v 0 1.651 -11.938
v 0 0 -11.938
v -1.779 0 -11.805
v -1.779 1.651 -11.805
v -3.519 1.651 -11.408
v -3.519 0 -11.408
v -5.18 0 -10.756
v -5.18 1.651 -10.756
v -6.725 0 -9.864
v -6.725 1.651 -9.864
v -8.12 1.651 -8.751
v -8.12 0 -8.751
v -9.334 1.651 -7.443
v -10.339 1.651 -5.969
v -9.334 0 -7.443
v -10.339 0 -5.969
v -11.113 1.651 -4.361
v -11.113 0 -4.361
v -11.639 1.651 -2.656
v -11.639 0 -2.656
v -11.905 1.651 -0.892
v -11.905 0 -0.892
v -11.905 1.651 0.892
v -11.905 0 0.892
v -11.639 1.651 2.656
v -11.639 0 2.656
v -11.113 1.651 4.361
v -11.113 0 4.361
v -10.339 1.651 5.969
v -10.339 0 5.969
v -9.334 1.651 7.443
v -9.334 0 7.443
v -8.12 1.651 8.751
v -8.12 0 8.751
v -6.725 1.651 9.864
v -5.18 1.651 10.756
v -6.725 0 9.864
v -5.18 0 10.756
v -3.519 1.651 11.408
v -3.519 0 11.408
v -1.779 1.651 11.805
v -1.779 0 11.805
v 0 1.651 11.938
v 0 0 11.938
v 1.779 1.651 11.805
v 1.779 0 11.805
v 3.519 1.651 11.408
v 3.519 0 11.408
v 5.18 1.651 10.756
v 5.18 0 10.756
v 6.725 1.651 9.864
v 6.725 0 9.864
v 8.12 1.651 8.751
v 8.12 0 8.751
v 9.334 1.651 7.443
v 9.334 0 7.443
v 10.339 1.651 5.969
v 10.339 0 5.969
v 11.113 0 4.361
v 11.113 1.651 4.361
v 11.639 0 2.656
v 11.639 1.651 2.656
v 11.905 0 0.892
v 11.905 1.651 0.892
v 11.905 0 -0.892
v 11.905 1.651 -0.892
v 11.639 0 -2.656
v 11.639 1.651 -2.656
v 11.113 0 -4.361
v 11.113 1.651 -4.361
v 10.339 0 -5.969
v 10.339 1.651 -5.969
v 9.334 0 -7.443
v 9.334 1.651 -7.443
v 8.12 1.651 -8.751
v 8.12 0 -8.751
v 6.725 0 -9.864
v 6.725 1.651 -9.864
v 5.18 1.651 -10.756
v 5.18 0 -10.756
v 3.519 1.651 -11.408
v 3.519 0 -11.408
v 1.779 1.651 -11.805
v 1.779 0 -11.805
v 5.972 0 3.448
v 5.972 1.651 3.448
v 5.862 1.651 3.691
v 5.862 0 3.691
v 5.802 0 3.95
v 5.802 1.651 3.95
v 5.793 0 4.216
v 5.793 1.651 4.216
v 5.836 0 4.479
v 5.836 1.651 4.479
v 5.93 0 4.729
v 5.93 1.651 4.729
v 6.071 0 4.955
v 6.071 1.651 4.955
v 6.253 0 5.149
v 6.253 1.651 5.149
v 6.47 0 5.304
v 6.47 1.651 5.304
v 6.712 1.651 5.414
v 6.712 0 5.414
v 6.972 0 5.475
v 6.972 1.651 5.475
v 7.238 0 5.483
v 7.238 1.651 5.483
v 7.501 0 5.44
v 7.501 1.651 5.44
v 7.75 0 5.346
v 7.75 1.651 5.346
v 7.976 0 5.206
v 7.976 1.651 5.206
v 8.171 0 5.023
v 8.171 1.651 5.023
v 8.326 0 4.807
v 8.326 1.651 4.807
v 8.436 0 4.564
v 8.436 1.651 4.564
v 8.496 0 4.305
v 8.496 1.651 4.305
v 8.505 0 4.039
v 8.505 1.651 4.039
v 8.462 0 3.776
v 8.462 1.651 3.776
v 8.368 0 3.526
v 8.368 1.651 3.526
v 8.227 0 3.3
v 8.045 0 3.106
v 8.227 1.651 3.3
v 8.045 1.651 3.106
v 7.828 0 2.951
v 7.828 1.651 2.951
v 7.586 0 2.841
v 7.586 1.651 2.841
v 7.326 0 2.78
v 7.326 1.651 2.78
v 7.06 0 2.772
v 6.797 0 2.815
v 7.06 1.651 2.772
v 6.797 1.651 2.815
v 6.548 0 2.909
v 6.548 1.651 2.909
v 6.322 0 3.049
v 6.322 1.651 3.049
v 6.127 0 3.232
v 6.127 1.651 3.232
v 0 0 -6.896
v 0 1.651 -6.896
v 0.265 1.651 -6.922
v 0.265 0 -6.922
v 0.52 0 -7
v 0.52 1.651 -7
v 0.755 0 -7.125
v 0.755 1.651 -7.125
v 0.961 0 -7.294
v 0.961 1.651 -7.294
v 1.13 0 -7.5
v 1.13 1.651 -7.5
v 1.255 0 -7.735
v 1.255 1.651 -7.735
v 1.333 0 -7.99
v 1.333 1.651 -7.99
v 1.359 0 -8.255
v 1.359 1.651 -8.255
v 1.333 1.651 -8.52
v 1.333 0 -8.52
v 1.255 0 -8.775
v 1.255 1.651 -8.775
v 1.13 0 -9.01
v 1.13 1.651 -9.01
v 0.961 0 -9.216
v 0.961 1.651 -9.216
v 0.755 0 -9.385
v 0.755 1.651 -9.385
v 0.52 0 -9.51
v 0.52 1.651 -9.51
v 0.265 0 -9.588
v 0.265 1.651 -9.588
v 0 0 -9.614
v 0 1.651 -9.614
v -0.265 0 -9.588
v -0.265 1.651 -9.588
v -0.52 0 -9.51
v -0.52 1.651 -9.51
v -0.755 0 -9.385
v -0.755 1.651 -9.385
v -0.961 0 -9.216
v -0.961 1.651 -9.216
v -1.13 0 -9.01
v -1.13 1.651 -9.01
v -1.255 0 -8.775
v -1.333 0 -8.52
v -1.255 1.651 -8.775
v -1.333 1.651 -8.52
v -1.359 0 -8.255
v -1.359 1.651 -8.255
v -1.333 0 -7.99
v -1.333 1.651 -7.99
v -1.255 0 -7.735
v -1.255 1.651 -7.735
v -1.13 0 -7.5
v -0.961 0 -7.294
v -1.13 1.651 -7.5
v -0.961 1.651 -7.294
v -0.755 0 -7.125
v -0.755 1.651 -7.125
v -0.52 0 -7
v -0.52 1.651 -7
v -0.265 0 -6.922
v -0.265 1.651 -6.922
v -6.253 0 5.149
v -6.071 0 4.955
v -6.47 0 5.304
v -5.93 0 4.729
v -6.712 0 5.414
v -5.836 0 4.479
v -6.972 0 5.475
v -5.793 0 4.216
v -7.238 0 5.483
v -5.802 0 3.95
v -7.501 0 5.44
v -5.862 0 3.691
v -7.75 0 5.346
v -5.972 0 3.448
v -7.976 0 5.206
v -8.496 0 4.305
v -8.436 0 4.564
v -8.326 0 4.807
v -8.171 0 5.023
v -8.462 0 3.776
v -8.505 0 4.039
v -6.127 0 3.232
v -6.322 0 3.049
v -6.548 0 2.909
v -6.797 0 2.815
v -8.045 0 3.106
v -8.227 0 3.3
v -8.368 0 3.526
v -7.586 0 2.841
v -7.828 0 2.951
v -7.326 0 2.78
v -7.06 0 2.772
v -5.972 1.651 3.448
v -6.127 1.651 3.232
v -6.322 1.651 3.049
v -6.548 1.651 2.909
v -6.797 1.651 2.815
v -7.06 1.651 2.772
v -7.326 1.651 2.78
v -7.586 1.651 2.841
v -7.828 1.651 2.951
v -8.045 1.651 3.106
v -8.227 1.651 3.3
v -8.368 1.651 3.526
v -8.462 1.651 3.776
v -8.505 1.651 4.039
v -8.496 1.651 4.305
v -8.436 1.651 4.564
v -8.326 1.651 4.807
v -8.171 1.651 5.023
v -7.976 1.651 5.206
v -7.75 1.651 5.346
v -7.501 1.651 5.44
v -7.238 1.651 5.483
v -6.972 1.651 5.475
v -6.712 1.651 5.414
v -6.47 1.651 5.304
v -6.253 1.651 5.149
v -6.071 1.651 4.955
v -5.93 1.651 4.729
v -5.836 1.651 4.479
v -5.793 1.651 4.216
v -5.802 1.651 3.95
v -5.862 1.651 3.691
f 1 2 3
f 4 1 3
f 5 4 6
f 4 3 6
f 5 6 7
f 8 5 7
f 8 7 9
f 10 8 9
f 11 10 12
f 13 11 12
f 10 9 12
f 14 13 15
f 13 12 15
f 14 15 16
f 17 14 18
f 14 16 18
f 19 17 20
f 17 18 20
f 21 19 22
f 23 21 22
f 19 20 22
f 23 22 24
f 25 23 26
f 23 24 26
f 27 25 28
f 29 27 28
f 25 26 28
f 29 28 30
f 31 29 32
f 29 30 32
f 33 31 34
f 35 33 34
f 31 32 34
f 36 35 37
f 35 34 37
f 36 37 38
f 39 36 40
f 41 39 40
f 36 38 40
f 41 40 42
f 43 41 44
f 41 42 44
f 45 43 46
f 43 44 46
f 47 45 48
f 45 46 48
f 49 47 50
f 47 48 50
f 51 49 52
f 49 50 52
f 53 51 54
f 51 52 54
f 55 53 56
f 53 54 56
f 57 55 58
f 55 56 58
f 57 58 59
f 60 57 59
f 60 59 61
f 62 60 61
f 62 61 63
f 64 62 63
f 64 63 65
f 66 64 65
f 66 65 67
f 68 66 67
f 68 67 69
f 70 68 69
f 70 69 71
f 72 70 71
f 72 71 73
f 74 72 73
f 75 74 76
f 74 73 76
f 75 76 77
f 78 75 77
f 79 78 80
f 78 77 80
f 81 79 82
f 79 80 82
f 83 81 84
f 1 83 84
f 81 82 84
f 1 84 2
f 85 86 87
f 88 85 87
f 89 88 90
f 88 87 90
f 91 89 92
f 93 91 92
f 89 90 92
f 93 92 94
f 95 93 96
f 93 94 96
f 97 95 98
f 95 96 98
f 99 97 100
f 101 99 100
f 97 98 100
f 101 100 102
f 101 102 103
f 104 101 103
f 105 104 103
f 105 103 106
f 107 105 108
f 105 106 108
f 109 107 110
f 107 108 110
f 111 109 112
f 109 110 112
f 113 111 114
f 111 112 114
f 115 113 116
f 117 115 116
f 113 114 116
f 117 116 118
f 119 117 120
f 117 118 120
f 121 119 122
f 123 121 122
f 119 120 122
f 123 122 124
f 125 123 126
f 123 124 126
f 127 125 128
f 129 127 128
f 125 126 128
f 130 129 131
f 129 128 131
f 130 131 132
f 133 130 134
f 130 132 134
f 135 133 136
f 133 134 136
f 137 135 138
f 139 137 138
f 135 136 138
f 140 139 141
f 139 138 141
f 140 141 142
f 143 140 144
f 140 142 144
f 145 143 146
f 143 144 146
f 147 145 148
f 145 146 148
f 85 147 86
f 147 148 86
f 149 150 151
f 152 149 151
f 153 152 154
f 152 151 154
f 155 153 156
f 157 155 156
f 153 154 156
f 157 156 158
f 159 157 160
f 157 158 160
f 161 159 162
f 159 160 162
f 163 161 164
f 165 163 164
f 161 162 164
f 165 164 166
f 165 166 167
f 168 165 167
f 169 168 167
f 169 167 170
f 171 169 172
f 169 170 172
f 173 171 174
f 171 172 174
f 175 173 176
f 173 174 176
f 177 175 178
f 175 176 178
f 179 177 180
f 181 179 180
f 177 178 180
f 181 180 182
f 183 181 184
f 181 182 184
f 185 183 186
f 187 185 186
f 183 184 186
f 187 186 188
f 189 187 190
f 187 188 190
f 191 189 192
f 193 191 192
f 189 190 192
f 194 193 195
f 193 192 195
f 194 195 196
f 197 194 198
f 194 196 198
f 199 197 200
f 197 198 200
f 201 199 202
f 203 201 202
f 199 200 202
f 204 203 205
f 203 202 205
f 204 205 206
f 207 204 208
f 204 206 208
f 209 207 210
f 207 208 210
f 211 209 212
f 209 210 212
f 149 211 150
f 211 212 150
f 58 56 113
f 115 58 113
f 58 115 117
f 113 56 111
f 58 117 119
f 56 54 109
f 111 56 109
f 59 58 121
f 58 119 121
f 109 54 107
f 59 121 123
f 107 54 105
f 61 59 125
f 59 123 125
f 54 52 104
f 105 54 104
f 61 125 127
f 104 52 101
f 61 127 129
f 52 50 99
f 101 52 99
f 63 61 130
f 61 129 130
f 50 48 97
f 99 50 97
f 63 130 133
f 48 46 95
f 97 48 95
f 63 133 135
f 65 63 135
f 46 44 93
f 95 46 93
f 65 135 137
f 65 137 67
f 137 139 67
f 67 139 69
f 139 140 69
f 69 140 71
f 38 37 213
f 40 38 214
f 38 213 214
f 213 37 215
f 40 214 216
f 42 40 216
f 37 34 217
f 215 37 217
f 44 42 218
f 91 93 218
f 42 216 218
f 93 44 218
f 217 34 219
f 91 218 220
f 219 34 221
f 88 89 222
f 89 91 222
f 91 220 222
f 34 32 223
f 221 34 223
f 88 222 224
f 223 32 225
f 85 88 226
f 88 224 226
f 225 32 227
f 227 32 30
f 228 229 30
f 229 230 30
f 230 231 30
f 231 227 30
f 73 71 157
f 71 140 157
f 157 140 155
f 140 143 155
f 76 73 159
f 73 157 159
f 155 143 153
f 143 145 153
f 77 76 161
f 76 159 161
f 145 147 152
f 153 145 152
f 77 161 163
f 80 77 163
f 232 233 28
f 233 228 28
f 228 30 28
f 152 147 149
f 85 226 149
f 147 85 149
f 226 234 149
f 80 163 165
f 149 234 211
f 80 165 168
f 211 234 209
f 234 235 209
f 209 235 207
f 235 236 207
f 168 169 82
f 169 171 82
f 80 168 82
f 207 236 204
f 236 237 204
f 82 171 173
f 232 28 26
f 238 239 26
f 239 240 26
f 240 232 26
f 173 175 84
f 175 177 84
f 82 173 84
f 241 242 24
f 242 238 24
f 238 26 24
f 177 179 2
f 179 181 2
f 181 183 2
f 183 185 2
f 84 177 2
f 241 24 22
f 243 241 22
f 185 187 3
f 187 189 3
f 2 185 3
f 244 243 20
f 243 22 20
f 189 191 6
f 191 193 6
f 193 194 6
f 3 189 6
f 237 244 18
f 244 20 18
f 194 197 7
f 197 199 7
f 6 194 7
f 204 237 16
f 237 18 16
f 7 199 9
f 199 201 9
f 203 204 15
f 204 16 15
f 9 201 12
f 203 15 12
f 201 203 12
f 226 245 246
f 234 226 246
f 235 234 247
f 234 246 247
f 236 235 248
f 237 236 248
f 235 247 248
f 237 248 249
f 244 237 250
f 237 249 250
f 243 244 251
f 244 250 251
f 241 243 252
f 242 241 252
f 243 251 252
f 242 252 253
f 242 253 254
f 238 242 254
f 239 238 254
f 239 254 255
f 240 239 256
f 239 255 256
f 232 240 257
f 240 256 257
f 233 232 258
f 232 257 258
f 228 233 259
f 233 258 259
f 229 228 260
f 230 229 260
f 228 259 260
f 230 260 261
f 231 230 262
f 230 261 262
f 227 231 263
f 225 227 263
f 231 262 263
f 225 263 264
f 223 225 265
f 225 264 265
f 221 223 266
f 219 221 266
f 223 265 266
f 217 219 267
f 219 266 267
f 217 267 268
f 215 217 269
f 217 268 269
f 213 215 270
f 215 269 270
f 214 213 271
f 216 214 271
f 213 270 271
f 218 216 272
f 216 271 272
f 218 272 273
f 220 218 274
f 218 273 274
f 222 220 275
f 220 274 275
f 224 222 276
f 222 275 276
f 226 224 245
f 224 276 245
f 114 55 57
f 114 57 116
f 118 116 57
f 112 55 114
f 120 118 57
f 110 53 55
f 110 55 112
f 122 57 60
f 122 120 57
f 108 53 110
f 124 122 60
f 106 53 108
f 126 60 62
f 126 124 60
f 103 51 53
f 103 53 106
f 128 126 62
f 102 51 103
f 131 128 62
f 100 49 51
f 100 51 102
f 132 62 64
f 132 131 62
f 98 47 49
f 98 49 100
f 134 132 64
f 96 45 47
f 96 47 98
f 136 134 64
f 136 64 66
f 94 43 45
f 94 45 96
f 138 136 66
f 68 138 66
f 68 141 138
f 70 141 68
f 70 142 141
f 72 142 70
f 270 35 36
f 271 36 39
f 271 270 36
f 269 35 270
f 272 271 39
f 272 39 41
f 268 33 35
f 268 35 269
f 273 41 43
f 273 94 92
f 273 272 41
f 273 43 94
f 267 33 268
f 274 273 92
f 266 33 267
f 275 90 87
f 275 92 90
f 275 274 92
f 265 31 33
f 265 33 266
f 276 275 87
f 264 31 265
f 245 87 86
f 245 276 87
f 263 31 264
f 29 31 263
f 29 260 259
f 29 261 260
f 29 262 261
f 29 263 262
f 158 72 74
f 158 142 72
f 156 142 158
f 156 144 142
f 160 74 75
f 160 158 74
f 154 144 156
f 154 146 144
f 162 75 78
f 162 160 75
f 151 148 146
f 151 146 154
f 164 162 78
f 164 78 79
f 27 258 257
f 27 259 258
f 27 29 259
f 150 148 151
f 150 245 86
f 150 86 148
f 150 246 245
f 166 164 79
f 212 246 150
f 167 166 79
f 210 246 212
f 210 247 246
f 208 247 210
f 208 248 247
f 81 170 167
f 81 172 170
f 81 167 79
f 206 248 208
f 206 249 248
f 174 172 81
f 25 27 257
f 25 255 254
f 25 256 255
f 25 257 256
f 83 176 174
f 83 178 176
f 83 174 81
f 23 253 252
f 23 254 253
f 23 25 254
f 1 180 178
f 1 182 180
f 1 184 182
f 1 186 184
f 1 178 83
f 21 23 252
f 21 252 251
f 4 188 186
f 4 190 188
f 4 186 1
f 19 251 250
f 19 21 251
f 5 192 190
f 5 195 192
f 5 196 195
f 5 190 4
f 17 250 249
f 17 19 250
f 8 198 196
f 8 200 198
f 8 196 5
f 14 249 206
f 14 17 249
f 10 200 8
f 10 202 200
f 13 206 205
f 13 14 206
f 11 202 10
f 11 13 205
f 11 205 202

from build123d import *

# Parameters (mm, degrees)
SKETCH1_R           = 11.938
BOSS_EXTRUDE1_DEPTH = 1.651
SKETCH2_R           = 1.3589
CUT_EXTRUDE1_DEPTH  = 1.651
CIRPATTERN1_COUNT   = 3


with BuildPart() as part:
    # Sketch1 → Boss-Extrude1 (new body)
    with BuildSketch(Plane(origin=(0, 0, 0), x_dir=(1, 0, 0), z_dir=(0, 1, 0))):
        with Locations(Location((0, 0, 0), (0, 0, 90))):
            Circle(SKETCH1_R)
    extrude(amount=BOSS_EXTRUDE1_DEPTH)

    # Sketch2 → Cut-Extrude1 (cut)
    with BuildSketch(Plane(origin=(0, 1.651, 0), x_dir=(1, 0, 0), z_dir=(0, 1, 0))):
        with Locations(Location((0, 8.255, 0), (0, 0, 270))):
            Circle(SKETCH2_R)
    cut_extrude1 = extrude(amount=-CUT_EXTRUDE1_DEPTH, mode=Mode.SUBTRACT)

    # CirPattern1: Cut-Extrude1 ×3 about axis
    cirpattern1_axis = Axis((0, 0, 0), (0, 1, 0))
    for i in range(1, CIRPATTERN1_COUNT):
        add(cut_extrude1.rotate(cirpattern1_axis, i * 360 / CIRPATTERN1_COUNT), mode=Mode.SUBTRACT)


solid = part.part
